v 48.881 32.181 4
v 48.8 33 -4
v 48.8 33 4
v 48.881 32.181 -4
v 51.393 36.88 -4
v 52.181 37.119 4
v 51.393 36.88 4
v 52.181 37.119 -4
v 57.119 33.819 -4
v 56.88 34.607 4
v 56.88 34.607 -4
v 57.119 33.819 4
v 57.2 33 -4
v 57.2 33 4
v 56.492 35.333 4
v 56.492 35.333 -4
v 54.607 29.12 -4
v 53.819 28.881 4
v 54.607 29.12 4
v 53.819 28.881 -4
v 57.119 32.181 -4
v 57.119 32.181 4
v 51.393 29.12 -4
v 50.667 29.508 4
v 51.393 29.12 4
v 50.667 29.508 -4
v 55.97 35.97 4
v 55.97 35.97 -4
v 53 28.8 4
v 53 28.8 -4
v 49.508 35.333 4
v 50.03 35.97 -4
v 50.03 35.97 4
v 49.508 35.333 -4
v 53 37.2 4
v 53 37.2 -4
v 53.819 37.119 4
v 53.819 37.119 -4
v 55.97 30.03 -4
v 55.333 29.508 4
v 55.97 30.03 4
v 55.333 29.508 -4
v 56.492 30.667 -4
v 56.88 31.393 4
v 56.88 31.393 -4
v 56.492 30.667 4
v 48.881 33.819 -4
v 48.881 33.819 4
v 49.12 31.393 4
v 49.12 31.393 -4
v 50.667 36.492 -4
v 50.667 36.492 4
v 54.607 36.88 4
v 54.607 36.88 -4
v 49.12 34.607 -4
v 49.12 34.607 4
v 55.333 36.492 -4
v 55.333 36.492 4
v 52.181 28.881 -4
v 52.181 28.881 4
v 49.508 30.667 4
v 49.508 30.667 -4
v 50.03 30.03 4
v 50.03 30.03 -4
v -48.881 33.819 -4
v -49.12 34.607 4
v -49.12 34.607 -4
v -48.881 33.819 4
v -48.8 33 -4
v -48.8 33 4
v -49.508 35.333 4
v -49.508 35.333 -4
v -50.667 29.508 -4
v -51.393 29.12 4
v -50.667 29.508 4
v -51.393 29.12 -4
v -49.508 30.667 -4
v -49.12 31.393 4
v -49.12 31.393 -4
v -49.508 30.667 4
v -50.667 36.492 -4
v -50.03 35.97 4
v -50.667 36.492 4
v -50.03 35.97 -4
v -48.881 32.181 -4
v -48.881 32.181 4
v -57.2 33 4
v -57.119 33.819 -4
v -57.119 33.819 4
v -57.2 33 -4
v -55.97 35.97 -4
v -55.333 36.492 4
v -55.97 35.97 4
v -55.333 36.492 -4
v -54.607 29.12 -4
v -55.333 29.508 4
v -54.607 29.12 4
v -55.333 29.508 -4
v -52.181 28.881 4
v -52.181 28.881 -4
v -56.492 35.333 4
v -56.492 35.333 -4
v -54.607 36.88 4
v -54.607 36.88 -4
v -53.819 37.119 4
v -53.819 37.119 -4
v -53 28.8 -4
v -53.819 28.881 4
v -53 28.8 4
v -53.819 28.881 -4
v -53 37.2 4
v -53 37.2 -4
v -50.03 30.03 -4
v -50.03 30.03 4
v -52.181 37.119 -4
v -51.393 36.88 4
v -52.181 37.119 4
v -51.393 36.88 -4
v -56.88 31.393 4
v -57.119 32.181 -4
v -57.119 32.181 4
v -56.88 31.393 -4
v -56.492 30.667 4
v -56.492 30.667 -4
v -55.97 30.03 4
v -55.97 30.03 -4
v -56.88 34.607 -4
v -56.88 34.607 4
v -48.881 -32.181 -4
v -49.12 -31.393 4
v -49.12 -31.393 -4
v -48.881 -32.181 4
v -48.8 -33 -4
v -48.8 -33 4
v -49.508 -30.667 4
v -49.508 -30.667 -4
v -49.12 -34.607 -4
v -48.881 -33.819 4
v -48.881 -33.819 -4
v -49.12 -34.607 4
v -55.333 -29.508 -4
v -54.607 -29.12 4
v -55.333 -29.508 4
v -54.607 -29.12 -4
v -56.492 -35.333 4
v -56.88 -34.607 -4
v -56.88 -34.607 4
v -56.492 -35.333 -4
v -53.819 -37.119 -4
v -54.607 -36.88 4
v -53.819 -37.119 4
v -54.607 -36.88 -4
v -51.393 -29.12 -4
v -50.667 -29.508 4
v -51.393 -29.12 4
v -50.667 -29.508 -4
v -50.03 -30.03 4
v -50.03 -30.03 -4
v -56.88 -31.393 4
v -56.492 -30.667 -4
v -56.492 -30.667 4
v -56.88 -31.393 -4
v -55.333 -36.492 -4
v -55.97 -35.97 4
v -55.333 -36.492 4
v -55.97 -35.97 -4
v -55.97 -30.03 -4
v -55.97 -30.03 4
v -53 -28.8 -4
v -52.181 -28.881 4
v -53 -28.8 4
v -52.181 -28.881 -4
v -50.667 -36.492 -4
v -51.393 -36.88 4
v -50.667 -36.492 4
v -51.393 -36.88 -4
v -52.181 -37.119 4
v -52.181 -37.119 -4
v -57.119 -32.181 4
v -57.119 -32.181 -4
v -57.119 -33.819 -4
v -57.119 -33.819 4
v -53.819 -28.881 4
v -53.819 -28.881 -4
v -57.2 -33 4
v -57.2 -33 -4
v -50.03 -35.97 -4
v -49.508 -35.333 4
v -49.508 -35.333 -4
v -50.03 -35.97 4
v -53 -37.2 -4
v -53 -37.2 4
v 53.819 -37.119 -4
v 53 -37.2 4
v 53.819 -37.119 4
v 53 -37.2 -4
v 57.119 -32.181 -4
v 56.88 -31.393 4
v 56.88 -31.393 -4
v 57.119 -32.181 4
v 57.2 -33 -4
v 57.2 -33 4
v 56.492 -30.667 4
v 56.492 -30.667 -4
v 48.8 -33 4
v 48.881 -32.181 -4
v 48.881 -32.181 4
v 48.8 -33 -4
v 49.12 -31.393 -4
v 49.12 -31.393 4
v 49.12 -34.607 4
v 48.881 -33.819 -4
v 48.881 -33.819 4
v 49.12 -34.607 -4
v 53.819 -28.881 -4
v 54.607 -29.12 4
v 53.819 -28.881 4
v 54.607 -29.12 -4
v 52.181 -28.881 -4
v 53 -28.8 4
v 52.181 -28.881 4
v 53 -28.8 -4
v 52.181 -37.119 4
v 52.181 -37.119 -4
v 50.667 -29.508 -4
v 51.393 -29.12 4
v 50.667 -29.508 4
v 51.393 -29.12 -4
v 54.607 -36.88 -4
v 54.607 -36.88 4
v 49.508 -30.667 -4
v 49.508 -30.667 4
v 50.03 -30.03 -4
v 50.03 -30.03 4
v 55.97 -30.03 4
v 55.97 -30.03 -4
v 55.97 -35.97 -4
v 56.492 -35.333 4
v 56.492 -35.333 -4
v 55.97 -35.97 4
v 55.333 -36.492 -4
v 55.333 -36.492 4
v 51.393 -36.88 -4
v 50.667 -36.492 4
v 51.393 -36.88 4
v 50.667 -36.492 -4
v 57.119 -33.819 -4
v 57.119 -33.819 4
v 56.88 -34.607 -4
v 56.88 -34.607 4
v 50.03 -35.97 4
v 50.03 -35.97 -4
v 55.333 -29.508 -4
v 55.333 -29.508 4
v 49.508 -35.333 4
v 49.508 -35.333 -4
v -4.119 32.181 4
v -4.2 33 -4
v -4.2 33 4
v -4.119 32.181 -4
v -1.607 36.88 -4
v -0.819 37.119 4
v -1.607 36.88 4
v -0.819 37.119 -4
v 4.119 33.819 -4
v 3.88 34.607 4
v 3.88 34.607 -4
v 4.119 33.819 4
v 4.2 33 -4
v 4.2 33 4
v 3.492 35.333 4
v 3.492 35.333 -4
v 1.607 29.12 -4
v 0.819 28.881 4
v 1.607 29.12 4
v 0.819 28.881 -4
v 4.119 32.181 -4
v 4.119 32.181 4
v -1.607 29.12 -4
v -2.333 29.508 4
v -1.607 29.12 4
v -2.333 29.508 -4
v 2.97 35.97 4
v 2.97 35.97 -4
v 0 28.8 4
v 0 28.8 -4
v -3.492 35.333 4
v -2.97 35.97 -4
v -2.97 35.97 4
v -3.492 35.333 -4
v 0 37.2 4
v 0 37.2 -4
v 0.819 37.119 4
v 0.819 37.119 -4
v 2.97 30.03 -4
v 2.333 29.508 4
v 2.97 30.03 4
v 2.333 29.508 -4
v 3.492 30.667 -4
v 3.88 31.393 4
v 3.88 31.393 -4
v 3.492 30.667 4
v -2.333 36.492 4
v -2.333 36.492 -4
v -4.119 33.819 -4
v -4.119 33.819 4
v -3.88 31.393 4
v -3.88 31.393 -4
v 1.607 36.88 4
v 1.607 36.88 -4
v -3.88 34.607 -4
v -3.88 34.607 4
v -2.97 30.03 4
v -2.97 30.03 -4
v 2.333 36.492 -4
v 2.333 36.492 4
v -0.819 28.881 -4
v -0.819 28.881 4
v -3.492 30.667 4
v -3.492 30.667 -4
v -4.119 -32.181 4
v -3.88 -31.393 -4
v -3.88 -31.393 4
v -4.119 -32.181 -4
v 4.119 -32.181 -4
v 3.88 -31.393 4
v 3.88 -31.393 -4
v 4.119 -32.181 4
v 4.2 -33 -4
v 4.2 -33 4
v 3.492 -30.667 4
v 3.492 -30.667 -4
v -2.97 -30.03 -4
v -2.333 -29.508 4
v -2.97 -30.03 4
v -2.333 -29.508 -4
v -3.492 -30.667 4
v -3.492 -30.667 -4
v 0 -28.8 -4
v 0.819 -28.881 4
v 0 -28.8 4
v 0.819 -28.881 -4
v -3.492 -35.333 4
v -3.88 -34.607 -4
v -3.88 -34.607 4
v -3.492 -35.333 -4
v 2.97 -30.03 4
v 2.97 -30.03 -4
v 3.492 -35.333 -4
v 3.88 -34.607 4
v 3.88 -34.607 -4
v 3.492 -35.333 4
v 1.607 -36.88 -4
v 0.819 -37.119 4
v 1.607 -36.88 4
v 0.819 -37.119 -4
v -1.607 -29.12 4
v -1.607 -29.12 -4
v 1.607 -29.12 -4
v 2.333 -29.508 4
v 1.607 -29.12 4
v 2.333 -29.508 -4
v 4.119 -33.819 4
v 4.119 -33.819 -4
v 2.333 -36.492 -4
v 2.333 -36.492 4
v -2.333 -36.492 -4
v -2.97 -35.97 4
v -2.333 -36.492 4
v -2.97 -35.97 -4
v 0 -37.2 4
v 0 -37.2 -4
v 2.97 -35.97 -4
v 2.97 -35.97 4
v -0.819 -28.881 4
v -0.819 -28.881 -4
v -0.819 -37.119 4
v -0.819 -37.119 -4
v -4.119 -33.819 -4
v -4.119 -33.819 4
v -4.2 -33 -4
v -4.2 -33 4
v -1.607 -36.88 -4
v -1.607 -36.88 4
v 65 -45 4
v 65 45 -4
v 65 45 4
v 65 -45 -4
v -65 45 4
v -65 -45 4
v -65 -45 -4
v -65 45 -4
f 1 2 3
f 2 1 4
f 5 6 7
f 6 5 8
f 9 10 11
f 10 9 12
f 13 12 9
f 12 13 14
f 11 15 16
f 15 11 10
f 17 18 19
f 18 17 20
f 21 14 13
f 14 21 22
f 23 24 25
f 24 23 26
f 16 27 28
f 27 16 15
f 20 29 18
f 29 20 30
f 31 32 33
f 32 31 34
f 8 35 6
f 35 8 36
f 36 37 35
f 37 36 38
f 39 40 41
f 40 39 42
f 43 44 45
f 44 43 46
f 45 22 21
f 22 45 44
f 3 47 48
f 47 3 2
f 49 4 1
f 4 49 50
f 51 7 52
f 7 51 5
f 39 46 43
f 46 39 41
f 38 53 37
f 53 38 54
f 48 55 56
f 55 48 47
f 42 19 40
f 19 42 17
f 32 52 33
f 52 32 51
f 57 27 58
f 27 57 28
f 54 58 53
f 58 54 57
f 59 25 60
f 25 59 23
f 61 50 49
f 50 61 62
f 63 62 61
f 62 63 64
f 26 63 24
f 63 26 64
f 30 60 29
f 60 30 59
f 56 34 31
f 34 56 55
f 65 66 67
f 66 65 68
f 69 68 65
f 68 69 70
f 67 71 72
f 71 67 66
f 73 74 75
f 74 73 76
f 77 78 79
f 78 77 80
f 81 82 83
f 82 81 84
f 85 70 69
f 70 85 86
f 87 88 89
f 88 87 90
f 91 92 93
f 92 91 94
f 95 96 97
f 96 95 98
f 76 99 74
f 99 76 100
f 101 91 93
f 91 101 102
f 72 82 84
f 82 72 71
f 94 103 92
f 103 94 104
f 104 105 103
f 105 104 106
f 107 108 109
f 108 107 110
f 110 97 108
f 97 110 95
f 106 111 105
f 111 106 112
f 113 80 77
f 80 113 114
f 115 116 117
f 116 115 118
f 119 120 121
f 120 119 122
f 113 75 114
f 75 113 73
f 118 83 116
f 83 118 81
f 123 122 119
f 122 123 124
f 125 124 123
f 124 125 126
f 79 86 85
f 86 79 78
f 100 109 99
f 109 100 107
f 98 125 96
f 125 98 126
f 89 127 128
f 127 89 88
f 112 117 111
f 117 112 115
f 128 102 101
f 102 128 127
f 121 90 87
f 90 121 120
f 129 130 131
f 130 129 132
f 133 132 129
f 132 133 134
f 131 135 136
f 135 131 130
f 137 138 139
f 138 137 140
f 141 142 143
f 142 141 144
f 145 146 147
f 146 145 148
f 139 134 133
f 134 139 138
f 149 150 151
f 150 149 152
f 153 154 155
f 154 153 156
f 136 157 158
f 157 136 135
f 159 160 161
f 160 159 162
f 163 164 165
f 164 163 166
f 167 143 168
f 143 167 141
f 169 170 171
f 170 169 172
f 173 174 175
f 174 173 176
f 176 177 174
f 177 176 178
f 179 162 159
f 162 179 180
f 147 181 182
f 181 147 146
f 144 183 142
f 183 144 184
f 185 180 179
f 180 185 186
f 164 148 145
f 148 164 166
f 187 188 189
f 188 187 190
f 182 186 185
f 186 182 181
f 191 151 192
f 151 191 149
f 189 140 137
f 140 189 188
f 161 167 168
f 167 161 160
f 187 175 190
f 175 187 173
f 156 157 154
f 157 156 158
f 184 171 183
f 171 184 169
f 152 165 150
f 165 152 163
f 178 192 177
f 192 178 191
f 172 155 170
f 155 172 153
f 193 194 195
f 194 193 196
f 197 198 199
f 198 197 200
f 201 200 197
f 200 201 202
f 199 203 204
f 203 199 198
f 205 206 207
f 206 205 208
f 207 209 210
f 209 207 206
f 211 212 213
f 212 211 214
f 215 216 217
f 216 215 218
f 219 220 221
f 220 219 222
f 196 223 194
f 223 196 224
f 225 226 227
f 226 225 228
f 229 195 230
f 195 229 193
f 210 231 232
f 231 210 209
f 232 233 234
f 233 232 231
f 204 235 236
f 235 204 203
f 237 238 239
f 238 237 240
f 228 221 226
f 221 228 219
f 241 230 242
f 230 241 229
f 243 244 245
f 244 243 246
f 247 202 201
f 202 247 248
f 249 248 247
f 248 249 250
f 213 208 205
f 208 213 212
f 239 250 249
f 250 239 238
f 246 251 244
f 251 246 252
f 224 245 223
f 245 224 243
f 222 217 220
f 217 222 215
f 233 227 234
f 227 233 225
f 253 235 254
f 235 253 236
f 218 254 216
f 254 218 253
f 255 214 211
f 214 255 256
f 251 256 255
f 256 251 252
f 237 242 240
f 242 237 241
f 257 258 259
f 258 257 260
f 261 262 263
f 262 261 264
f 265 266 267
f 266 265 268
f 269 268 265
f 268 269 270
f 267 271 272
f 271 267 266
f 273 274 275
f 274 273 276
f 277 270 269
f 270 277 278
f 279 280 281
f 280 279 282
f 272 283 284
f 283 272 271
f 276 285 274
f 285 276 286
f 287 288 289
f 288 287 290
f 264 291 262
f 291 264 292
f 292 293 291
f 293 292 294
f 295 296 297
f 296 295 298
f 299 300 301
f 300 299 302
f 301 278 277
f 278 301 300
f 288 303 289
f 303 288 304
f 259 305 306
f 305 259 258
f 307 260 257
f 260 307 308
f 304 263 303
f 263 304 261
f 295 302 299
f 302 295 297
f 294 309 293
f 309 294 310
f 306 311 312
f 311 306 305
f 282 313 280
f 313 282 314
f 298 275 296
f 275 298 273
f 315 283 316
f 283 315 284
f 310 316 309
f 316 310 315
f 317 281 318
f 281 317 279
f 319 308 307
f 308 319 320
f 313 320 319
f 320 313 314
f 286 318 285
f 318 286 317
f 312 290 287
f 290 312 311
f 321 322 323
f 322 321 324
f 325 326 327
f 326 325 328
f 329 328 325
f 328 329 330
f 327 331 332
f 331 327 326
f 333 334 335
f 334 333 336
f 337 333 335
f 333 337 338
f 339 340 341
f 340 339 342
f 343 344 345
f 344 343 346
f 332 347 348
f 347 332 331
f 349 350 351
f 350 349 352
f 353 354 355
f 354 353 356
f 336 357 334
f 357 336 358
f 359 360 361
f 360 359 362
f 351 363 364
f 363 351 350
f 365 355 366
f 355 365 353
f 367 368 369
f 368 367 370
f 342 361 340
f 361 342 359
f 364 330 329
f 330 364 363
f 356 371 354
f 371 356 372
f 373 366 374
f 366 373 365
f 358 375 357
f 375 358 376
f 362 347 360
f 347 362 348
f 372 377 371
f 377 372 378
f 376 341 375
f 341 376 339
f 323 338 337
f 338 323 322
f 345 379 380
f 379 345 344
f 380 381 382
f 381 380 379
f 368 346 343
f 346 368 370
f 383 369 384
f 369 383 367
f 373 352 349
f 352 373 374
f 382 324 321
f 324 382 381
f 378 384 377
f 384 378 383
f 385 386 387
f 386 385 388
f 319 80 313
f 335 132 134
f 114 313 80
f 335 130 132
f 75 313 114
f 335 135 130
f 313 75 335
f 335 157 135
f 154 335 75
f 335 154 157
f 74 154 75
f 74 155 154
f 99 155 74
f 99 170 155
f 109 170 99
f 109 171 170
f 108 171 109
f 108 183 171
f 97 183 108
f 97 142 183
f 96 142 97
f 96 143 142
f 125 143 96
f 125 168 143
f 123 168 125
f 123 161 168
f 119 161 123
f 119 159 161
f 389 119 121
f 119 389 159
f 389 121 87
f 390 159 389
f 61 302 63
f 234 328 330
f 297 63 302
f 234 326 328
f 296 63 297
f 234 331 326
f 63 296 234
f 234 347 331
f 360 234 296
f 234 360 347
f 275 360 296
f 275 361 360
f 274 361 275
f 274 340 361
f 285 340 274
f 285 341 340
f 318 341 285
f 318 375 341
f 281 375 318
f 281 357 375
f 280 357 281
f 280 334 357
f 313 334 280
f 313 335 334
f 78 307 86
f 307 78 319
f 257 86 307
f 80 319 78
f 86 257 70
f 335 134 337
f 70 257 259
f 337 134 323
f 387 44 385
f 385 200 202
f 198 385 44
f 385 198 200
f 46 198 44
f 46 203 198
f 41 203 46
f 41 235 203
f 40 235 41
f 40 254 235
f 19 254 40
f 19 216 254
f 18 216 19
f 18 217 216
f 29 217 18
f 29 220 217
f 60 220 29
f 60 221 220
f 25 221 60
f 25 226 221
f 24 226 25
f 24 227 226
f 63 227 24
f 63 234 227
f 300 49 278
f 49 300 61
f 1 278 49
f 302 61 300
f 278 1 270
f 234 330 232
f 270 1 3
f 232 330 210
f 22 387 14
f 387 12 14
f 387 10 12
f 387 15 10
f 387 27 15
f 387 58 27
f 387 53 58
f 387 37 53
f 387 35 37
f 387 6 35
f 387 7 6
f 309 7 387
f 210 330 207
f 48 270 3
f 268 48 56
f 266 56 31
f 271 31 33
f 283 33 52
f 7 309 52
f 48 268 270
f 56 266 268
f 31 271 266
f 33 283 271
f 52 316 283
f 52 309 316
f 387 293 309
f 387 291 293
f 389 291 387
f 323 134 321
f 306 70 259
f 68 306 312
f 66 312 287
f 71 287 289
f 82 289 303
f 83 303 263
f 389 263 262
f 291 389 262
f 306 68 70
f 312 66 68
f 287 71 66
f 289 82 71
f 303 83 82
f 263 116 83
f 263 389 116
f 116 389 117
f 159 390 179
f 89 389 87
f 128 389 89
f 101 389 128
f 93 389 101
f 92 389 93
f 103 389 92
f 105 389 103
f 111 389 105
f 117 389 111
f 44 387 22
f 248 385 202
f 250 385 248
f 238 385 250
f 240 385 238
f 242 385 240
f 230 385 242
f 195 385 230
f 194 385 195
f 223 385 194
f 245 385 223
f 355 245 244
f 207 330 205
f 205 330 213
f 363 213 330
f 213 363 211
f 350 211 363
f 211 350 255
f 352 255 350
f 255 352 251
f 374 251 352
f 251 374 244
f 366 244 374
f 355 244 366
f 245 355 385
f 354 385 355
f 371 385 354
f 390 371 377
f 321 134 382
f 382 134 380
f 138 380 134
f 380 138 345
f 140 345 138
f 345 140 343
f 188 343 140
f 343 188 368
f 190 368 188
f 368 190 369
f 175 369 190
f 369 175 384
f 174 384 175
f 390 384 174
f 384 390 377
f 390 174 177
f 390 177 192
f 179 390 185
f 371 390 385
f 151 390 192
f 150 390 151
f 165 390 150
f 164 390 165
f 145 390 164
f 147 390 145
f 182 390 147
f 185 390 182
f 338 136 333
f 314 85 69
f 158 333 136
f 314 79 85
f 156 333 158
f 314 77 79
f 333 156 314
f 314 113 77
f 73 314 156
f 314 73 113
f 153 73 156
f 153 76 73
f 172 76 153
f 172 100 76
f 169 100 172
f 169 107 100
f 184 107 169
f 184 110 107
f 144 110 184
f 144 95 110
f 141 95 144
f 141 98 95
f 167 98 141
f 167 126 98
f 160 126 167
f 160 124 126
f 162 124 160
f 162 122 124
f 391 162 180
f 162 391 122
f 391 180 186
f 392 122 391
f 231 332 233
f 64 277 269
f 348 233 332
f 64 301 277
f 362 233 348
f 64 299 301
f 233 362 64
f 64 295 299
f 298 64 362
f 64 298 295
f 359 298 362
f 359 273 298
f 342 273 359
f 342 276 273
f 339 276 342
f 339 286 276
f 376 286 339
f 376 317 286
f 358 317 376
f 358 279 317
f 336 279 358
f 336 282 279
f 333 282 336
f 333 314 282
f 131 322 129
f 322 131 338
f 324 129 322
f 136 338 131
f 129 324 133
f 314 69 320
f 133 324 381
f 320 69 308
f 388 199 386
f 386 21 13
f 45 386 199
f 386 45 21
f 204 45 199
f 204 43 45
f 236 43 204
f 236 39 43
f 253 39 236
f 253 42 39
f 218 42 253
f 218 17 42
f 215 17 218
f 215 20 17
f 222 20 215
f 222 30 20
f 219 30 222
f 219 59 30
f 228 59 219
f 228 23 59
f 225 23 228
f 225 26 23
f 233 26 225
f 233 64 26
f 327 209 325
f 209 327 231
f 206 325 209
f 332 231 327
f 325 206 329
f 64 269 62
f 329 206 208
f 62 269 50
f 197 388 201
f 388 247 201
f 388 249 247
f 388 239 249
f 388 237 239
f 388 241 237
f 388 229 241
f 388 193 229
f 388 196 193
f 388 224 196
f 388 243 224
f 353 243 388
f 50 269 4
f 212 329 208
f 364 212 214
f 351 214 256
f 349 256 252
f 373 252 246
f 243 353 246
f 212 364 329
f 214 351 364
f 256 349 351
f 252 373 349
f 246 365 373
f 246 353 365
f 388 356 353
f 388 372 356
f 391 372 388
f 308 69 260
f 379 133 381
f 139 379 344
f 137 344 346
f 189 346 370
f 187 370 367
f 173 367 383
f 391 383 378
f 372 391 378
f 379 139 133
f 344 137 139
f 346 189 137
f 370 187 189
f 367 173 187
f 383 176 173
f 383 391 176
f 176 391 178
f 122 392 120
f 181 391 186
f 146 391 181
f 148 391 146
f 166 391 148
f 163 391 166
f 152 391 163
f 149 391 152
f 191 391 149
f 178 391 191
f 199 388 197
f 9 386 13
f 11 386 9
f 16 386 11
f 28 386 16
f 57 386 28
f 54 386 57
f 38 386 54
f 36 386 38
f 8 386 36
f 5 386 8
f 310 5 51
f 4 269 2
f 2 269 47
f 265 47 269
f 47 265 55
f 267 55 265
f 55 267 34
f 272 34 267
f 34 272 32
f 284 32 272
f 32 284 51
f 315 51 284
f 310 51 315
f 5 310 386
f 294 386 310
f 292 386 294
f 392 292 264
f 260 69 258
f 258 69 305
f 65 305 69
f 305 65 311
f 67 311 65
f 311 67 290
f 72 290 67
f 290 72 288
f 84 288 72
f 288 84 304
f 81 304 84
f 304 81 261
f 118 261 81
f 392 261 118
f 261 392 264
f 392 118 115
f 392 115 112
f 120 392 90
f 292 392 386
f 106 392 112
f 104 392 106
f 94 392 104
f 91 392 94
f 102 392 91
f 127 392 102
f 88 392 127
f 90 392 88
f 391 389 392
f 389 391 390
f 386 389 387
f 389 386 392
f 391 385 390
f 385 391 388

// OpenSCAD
$fn = 32;

// ----------------------------------------------------------------------
// Corner plate 130 x 90 x 8
// 6 holes, centres taken from the edge offset
// ----------------------------------------------------------------------

// --- parameters (mm) ---
plate = [130, 90, 8];  // overall size (x, y, z)
holes = 6;             // number of holes the drawing asks for
hole_d = 8.4;          // hole diameter
edge = 12;             // hole centre offset from the plate edge

// --- derived feature positions (mm) ---
corner_x = plate[0] / 2 - edge;  // = 53   corner hole X
corner_y = plate[1] / 2 - edge;  // = 33   corner hole Y
feature_centers = [
  [corner_x, corner_y],
  [-corner_x, corner_y],
  [-corner_x, -corner_y],
  [corner_x, -corner_y],
  [0, corner_y],
  [0, -corner_y]
];   // hole centres the loop below drills

// plate outline, every hole drilled through with the same cutters
difference() {
  cube(plate, center = true);
  for (centre = feature_centers)
    translate([centre[0], centre[1], 0])
      cylinder(d = hole_d, h = plate[2] + 2, center = true);
}
